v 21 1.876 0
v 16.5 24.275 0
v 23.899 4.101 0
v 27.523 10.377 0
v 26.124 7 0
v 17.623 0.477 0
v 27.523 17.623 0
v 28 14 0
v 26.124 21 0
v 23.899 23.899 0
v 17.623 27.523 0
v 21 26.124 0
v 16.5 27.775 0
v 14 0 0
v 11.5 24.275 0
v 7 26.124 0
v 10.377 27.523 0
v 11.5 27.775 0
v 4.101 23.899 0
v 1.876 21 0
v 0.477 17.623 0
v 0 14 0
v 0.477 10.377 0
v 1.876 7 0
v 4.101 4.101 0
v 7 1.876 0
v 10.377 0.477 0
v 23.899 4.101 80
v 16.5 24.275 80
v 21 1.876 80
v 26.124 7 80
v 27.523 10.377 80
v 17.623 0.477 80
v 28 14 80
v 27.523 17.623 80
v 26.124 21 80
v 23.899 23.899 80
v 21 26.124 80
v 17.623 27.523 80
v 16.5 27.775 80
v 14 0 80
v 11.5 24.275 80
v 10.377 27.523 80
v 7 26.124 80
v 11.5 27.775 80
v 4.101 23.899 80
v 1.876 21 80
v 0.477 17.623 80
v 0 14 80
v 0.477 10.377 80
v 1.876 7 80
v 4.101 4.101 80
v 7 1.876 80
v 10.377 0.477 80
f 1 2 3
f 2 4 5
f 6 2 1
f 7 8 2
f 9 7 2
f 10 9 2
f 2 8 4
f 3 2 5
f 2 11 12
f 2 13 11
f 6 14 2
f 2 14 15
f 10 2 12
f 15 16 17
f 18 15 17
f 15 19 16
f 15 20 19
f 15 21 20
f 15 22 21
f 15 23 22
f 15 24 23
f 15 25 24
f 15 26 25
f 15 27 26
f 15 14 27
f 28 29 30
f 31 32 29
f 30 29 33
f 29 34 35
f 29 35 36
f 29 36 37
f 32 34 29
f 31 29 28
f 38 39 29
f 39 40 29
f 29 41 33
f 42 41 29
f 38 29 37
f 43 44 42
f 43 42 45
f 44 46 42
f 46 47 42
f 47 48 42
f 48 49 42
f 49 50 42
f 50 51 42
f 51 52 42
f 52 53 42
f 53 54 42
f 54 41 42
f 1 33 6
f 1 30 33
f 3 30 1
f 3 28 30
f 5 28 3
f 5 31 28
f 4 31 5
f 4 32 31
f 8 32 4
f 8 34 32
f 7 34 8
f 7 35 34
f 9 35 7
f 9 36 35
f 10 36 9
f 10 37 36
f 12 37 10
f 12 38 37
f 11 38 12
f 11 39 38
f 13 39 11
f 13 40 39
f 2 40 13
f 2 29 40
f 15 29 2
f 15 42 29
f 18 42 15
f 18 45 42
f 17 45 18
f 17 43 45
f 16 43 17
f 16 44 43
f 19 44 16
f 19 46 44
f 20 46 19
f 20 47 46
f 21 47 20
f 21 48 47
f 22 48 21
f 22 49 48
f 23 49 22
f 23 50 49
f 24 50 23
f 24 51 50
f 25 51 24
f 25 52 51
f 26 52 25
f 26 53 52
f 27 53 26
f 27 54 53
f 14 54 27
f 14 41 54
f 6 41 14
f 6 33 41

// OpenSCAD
$fn = 32;

// ----------------------------------------------------------------------
// Keyway shaft: d28 shaft, key 5 x 3.5 mm
// ----------------------------------------------------------------------

// --- parameters (mm) ---
shaft_r = 14;             // shaft radius
key_w = 5;                // keyway width
key_d = 3.5;              // keyway depth below the surface line
plate_t = 80;             // shaft length, Z (extrusion height)

shaft_d = 2 * shaft_r;  // shaft diameter
circle_step = 15;  // polygon sampling step, degrees

profile = [[10.377, 27.523], [7, 26.124], [4.101, 23.899], [1.876, 21], [0.477, 17.623], [0, 14], [0.477, 10.377], [1.876, 7], [4.101, 4.101], [7, 1.876], [10.377, 0.477], [14, 0], [17.623, 0.477], [21, 1.876], [23.899, 4.101], [26.124, 7], [27.523, 10.377], [28, 14], [27.523, 17.623], [26.124, 21], [23.899, 23.899], [21, 26.124], [17.623, 27.523], [16.5, 27.775], [16.5, 24.275], [11.5, 24.275], [11.5, 27.775]];  // primary outline, 27 points, counter clockwise

// --- the one profile operation ---
linear_extrude(height = plate_t) polygon(points = profile);
